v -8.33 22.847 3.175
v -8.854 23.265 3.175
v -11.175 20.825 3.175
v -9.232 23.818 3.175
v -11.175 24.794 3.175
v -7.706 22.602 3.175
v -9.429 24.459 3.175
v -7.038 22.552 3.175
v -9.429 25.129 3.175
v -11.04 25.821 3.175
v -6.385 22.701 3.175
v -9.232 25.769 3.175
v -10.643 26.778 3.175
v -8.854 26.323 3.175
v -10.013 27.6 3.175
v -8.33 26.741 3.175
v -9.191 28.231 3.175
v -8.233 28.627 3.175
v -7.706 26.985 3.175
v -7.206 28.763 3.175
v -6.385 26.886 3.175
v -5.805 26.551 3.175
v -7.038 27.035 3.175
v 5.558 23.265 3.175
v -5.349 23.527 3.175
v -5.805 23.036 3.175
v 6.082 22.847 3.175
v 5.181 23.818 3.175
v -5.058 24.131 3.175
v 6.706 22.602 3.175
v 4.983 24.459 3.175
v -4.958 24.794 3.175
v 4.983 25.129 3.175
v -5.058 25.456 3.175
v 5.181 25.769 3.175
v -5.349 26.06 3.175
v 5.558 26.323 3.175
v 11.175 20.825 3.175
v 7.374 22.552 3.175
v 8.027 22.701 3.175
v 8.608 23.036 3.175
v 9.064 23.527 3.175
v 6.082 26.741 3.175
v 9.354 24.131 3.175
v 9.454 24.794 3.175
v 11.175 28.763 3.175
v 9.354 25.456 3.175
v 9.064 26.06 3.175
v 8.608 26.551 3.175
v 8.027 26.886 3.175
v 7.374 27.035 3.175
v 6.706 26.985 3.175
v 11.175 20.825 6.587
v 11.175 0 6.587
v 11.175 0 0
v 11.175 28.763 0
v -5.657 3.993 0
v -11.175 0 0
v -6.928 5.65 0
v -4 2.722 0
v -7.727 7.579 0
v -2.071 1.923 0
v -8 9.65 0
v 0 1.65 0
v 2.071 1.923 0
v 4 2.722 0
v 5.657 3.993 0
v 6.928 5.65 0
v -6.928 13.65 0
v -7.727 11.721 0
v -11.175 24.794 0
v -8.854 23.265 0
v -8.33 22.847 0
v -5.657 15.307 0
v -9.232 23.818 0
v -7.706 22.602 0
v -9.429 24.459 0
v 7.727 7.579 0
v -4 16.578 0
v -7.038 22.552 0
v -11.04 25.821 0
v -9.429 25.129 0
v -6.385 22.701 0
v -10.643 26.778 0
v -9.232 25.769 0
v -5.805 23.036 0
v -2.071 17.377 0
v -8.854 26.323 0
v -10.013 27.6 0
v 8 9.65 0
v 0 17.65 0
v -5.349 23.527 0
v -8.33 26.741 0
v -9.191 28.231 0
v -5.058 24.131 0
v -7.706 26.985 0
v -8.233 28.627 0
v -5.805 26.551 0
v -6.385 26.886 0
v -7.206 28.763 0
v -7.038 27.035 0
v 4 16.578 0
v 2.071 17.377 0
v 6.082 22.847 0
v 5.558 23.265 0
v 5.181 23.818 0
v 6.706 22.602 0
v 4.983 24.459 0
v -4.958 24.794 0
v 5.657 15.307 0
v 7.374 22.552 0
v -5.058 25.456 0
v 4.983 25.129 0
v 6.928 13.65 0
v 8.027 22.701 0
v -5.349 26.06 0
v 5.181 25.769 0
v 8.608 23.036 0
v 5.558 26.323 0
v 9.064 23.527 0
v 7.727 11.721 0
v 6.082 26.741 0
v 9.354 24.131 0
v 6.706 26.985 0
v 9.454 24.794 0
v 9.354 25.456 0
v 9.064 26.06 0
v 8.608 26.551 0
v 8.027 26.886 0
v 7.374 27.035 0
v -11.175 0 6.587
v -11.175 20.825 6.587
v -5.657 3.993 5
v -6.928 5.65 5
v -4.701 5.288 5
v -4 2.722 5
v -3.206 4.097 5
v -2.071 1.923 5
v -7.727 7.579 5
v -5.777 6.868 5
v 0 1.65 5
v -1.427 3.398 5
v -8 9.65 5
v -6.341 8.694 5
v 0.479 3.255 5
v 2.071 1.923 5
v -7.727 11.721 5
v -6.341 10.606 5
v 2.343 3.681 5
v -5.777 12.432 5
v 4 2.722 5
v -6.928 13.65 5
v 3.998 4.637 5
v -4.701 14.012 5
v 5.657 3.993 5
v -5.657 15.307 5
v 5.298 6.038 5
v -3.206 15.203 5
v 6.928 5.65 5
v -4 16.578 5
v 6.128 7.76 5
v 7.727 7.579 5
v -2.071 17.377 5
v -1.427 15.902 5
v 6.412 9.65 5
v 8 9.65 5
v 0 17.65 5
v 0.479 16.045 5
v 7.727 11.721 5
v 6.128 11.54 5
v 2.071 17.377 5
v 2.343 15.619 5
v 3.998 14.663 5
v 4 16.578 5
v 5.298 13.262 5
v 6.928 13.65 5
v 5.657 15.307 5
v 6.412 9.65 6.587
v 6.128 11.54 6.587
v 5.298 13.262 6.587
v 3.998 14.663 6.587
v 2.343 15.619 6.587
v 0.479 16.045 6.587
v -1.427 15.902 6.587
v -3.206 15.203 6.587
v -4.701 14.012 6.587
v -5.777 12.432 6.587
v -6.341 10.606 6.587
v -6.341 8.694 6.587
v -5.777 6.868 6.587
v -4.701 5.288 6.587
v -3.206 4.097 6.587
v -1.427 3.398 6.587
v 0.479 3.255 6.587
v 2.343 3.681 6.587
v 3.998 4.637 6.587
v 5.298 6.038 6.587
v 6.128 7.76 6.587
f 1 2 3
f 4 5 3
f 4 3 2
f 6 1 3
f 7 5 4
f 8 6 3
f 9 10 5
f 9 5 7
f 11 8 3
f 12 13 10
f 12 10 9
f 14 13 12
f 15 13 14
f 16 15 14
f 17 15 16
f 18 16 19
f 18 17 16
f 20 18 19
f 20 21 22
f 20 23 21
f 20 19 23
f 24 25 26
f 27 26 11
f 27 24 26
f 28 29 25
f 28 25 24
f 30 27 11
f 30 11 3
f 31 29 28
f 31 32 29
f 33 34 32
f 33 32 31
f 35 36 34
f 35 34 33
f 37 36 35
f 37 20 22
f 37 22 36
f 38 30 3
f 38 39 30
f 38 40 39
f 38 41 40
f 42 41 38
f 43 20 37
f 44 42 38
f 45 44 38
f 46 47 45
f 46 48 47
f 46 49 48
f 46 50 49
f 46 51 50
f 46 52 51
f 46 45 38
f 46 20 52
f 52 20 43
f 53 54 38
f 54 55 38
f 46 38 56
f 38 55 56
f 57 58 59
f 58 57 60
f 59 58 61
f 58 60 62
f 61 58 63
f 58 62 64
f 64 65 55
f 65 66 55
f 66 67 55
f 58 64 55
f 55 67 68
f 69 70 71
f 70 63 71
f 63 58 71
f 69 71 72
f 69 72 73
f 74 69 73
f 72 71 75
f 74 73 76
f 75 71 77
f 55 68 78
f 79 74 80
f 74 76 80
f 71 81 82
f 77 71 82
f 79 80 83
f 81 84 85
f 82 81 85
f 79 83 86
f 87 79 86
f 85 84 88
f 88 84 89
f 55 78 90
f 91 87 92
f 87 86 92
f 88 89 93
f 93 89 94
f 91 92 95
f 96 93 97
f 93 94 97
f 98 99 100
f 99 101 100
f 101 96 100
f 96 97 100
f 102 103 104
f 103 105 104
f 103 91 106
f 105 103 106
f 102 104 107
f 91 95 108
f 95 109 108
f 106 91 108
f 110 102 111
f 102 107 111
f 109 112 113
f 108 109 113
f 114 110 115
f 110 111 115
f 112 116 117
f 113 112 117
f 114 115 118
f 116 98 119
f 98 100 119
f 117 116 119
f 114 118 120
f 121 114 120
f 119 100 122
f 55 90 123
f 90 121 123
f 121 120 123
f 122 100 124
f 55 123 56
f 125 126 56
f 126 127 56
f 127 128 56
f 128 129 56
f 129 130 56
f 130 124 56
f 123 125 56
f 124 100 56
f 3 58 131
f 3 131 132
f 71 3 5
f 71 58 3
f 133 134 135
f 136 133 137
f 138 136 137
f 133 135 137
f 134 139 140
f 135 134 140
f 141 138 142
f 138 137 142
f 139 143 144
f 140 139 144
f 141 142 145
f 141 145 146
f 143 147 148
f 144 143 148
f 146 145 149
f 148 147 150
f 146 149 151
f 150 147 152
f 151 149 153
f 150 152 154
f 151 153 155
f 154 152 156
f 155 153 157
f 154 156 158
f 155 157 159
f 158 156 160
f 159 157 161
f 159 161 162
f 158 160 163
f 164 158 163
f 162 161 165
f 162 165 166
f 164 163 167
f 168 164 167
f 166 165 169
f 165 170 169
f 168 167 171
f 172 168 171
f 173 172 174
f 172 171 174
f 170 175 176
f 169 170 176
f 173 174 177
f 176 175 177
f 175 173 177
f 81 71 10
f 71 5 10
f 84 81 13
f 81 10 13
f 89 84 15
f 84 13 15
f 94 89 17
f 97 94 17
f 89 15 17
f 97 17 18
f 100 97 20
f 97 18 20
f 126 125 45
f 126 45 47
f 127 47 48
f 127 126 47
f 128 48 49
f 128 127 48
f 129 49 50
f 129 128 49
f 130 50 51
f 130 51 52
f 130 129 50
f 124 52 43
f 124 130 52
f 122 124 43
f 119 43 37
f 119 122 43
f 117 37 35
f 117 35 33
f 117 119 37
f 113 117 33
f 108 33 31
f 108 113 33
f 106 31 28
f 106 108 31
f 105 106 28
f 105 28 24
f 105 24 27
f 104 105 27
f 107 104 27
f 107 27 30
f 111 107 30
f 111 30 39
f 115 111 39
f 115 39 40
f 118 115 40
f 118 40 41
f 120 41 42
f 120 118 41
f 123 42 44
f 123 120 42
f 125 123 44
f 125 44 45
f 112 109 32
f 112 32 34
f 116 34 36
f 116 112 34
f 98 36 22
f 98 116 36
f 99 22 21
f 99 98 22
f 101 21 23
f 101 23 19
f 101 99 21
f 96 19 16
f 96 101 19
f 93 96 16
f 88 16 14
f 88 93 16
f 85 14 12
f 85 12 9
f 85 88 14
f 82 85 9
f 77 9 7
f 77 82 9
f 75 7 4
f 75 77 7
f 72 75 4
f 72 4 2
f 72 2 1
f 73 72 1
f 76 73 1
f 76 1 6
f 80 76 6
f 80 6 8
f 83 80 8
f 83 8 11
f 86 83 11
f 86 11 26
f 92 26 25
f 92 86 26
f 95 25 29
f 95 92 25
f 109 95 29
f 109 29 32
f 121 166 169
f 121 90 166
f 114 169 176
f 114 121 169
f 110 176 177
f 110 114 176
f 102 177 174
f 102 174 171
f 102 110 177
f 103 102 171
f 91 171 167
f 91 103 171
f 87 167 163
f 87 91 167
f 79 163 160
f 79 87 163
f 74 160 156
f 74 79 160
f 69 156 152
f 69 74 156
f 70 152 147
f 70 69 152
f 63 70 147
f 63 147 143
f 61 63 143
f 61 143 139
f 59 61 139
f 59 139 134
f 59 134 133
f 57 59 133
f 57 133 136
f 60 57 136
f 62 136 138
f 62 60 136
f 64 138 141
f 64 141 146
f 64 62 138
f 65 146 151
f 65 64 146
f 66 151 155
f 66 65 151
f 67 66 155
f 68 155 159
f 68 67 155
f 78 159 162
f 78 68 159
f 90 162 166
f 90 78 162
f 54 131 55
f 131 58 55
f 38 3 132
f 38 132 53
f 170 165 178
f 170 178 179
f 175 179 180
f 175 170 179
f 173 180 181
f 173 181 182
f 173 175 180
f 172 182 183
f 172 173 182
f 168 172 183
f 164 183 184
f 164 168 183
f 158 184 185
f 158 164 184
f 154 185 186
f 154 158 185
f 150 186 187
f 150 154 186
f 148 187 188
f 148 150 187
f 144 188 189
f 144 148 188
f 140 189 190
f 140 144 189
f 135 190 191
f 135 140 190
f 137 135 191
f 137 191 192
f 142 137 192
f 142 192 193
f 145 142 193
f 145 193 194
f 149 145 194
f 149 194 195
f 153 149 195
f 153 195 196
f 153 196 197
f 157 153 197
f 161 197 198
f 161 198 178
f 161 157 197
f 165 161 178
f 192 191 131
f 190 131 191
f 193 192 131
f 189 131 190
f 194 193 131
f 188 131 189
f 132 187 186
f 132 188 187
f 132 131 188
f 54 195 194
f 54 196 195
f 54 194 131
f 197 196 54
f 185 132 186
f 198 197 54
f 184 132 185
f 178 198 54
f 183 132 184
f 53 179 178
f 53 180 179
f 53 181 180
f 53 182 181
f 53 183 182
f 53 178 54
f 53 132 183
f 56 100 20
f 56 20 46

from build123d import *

# Parameters (mm, degrees)
F0_W     = 22.349994
F0_H     = 28.762516
F0_R     = 8
F0_R_2   = 2.2479
F1_DEPTH = 3.175
F2_W     = 22.349994
F2_H     = 20.825016
F2_R     = 8
F3_DEPTH = 1.82499
F4_W     = 22.349994
F4_H     = 20.825016
F4_R     = 8
F4_R_2   = 6.412497
F5_DEPTH = 1.5875
F6_R     = 3.96875


with BuildPart() as f1:
    # F0 (on Top) → F1 (new body)
    with BuildSketch(Plane.XY):
        with Locations((0, 14.381258)):
            Rectangle(F0_W, F0_H)
        with Locations((0, 9.650006)):
            Circle(F0_R, mode=Mode.SUBTRACT)
        with Locations((-7.206247, 24.793766)):
            Circle(F0_R_2, mode=Mode.SUBTRACT)
        with Locations((7.206247, 24.793766)):
            Circle(F0_R_2, mode=Mode.SUBTRACT)
    extrude(amount=F1_DEPTH)

    # F2 (on face) → F3 (join)
    with BuildSketch(Plane.XY.offset(3.175)):
        with Locations((0, 10.412508)):
            Rectangle(F2_W, F2_H)
        with Locations((0, 9.650006)):
            Circle(F2_R, mode=Mode.SUBTRACT)
    extrude(amount=F3_DEPTH)

    # F4 (on face) → F5 (join)
    with BuildSketch(Plane.XY.offset(4.99999)):
        with Locations((0, 10.412508)):
            Rectangle(F4_W, F4_H)
        with Locations((0, 9.650006)):
            Circle(F4_R, mode=Mode.SUBTRACT)
        with Locations((0, 9.650006)):
            Circle(F4_R)
        with Locations((0, 9.650006)):
            Circle(F4_R_2, mode=Mode.SUBTRACT)
    extrude(amount=F5_DEPTH)

    # F6
    f6_edges = [f1.edges().sort_by_distance(p)[0] for p in [
        (-11.174997, 28.762516, 1.5875),
    ]]
    fillet(f6_edges, radius=F6_R)


solid = f1.part
